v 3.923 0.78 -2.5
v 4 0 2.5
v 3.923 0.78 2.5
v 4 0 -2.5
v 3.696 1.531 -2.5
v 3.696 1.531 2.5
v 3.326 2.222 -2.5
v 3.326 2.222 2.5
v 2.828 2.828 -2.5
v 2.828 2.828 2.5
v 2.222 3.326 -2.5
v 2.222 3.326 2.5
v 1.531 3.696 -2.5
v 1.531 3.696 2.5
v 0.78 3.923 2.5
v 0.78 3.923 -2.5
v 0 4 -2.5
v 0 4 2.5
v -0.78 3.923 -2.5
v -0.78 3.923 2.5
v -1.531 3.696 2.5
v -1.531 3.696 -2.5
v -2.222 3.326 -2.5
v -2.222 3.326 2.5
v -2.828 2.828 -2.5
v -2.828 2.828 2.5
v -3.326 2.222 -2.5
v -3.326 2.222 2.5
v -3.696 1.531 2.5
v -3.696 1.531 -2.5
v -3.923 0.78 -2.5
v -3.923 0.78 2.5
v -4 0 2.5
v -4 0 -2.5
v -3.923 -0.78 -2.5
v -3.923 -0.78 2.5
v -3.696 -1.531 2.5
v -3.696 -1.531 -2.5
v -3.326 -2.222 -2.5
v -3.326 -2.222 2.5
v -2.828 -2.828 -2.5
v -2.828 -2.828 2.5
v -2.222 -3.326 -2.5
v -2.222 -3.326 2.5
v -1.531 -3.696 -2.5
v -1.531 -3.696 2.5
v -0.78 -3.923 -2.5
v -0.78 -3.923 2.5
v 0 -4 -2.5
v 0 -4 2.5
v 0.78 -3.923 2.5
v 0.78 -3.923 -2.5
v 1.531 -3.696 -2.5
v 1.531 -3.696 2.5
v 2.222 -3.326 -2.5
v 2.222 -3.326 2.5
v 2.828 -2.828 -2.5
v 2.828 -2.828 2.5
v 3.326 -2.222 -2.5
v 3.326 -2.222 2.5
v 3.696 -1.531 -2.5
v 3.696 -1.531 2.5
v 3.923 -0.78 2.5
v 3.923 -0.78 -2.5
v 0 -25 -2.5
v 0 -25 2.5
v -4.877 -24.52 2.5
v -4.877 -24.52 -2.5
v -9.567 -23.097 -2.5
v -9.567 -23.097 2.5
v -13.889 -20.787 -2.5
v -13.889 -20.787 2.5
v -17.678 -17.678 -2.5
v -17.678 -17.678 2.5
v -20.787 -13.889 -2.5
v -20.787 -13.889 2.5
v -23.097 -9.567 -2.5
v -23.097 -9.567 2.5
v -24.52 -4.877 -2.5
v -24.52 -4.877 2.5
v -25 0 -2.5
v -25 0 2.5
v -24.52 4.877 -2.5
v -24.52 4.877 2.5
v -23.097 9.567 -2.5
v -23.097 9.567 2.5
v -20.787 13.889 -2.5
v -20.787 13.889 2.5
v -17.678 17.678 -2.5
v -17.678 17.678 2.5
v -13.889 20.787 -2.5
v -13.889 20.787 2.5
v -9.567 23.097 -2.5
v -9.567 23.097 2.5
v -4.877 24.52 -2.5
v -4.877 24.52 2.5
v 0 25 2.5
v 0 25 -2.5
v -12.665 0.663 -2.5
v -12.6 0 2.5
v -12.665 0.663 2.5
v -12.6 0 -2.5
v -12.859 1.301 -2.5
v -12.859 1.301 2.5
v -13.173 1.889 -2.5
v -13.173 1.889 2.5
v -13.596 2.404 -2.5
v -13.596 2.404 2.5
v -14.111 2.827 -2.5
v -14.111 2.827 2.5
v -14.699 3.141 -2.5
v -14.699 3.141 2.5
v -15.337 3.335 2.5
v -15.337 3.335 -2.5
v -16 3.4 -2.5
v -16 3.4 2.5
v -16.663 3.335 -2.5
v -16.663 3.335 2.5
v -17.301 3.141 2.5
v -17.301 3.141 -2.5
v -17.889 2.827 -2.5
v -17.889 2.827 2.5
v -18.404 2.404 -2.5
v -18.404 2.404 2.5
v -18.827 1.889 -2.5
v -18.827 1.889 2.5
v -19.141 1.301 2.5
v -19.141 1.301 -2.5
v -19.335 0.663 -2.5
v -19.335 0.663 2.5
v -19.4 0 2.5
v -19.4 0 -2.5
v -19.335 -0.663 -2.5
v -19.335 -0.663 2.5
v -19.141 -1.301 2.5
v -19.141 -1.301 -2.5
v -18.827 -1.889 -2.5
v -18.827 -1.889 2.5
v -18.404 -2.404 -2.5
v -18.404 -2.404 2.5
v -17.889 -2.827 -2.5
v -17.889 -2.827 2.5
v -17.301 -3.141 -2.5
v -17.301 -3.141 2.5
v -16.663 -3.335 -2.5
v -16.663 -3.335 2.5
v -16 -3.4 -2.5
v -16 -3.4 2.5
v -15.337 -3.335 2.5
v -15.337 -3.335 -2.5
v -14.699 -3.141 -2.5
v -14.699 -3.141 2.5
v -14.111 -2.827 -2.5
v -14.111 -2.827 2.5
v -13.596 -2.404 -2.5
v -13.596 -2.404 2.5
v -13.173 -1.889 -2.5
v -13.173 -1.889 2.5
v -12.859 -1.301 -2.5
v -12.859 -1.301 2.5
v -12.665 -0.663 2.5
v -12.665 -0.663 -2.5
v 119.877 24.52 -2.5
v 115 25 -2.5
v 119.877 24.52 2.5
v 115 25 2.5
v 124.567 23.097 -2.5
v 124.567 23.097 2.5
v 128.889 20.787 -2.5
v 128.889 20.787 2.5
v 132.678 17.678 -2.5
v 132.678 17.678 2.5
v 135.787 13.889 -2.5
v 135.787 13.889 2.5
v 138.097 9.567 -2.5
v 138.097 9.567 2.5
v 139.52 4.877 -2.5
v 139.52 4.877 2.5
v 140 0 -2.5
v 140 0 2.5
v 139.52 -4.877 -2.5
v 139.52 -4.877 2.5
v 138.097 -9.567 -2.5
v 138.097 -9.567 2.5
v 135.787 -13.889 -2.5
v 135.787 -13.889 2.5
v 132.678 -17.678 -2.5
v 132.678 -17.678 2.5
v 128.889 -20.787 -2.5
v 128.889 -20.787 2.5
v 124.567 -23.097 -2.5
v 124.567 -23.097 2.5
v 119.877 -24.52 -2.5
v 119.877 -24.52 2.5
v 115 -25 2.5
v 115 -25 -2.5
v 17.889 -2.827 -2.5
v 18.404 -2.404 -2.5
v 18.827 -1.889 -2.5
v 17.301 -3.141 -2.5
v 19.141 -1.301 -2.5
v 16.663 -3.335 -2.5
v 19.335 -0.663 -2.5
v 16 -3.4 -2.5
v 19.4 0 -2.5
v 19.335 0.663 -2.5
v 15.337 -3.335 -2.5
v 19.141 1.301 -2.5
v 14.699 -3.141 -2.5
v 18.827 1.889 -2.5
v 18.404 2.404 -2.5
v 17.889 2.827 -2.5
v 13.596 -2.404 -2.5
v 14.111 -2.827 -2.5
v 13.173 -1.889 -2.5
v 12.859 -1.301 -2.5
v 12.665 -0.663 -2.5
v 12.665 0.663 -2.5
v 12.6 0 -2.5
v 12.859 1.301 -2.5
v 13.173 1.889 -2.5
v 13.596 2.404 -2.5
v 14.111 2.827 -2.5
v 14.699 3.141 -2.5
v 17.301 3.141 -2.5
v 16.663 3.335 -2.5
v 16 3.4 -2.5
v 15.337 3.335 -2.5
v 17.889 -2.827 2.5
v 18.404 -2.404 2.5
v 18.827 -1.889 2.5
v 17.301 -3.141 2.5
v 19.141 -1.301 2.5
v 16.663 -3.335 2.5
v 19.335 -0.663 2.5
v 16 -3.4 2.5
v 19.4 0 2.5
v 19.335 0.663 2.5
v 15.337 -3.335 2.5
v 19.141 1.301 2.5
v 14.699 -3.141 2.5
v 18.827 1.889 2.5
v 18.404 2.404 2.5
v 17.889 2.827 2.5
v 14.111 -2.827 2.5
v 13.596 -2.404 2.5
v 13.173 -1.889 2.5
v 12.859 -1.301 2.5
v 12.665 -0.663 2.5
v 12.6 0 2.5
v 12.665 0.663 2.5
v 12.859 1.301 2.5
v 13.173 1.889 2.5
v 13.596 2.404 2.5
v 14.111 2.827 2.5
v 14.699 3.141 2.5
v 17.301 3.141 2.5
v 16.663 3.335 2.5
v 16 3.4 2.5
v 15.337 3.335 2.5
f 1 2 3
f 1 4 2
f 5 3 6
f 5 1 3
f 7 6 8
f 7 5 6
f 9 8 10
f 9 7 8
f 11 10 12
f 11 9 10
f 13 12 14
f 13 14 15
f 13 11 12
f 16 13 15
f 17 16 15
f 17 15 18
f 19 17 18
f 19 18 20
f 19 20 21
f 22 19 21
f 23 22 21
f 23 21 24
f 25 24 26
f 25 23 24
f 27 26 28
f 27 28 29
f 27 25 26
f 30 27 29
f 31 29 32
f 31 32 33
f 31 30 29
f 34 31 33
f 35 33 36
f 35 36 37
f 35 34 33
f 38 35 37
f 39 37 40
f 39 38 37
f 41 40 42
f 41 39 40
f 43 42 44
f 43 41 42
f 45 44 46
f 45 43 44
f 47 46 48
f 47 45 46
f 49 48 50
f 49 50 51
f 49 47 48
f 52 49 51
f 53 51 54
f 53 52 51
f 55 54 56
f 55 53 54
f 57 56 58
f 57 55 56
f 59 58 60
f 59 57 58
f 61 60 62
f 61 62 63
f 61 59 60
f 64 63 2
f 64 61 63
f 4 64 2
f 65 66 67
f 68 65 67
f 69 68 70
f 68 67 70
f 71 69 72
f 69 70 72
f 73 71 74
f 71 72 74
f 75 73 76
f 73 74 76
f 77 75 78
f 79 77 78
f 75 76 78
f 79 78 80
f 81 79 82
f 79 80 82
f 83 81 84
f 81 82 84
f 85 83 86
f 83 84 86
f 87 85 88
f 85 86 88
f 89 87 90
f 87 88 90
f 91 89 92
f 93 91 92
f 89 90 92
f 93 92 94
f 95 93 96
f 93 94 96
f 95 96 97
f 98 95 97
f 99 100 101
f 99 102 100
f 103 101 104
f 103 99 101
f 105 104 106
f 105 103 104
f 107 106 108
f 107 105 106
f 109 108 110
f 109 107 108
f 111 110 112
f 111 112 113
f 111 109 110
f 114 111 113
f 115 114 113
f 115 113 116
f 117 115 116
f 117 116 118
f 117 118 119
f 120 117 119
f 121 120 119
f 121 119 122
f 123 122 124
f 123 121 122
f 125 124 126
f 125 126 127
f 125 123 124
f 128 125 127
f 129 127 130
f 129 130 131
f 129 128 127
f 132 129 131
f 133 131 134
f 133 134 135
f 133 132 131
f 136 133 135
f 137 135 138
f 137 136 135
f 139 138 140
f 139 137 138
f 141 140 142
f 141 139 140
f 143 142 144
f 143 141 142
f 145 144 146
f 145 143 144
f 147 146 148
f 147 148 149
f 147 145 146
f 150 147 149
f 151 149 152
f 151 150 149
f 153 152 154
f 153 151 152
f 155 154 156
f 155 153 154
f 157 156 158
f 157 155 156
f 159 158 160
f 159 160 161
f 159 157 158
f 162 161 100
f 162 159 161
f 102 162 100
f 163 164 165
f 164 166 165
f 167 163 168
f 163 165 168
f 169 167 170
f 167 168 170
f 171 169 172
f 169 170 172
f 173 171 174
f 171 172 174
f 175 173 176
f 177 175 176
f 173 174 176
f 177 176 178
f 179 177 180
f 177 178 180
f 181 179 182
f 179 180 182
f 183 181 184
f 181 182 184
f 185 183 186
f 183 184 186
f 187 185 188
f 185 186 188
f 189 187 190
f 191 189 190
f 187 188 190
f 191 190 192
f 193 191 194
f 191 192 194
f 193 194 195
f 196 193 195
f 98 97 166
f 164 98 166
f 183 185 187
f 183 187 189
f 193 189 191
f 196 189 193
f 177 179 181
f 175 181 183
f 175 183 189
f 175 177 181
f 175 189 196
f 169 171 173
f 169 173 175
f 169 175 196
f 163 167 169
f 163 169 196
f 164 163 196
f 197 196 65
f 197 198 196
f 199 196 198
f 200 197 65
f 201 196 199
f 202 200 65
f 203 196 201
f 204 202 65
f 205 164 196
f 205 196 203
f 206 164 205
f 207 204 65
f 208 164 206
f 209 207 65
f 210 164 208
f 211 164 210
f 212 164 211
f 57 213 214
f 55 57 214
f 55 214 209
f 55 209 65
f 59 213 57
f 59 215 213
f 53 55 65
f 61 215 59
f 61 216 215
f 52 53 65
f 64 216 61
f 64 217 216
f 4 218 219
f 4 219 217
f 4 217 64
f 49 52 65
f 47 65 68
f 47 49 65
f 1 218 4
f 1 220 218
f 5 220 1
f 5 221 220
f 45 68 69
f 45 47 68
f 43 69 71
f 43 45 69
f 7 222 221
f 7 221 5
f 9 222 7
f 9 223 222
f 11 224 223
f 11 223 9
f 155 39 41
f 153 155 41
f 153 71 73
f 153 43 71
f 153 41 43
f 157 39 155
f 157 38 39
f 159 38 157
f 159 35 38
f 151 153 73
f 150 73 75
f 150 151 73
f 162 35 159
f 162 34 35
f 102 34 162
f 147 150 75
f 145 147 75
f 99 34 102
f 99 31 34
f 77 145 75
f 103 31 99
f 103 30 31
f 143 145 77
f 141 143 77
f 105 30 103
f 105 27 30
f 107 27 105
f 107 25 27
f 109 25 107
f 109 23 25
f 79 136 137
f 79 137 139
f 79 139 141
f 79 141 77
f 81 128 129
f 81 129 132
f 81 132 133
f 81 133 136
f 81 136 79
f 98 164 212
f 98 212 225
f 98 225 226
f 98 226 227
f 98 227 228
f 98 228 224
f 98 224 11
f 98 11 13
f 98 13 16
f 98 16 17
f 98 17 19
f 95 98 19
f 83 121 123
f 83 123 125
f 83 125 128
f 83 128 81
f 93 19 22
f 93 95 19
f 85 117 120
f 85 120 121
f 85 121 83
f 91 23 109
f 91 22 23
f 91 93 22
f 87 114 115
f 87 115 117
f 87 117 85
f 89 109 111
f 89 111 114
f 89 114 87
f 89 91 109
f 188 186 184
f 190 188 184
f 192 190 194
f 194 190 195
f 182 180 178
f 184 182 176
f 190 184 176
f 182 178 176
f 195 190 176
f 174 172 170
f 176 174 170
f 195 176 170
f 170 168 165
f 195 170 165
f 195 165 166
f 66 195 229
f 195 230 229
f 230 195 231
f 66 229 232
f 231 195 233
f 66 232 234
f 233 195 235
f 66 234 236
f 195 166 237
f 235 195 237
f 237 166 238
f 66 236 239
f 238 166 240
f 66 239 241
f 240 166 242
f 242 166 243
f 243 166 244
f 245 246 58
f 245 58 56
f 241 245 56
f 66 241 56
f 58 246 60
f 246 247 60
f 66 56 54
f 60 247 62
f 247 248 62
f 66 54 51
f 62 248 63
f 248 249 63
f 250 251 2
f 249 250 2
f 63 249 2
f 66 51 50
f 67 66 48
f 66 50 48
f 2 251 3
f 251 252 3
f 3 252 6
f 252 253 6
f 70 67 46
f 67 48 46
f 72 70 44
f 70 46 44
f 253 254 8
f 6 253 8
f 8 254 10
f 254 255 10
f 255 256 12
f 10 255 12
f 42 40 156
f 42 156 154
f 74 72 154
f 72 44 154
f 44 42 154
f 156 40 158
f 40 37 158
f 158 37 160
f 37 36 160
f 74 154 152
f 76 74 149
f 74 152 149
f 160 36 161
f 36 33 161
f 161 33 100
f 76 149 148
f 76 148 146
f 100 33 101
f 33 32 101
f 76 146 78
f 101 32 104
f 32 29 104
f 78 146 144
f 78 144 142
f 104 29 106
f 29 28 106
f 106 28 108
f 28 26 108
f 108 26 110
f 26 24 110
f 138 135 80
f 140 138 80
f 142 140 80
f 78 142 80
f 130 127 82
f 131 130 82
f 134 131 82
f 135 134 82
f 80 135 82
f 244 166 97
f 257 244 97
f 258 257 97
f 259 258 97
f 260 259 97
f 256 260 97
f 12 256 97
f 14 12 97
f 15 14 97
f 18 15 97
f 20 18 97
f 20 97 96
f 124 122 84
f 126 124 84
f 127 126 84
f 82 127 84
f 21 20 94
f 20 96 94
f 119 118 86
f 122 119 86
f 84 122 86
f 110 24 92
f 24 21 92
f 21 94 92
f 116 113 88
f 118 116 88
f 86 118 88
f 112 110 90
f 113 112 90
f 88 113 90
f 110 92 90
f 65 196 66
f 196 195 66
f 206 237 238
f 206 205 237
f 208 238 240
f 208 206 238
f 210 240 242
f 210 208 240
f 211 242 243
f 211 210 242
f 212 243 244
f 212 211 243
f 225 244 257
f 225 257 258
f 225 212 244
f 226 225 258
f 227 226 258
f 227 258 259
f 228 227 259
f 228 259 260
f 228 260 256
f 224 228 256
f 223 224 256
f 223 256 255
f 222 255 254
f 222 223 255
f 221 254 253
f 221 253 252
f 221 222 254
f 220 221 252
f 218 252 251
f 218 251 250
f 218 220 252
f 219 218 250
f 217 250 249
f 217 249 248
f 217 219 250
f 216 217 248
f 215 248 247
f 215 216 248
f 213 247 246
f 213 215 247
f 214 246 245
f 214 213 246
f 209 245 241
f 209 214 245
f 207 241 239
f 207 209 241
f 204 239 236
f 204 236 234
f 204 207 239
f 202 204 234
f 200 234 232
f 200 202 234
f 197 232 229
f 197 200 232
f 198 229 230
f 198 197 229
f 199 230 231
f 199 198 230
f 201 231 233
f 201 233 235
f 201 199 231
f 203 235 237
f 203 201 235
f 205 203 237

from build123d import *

# Parameters (mm, degrees)
SKETCH2_R           = 4
SKETCH2_R_2         = 3.4
BOSS_EXTRUDE1_DEPTH = 2.5


with BuildPart() as part:
    # Sketch2 → Boss-Extrude1 (new, symmetric)
    with BuildSketch(Plane.XY):
        with BuildLine():
            Line((0, 25), (115, 25))
            ThreePointArc((115, 25), (140, 0), (115, -25))
            Line((115, -25), (0, -25))
            ThreePointArc((0, -25), (-25, 0), (0, 25))
        make_face()
        Circle(SKETCH2_R, mode=Mode.SUBTRACT)
        with Locations((16, 0)):
            Circle(SKETCH2_R_2, mode=Mode.SUBTRACT)
        with Locations((-16, 0)):
            Circle(SKETCH2_R_2, mode=Mode.SUBTRACT)
    extrude(amount=BOSS_EXTRUDE1_DEPTH, both=True)


solid = part.part
